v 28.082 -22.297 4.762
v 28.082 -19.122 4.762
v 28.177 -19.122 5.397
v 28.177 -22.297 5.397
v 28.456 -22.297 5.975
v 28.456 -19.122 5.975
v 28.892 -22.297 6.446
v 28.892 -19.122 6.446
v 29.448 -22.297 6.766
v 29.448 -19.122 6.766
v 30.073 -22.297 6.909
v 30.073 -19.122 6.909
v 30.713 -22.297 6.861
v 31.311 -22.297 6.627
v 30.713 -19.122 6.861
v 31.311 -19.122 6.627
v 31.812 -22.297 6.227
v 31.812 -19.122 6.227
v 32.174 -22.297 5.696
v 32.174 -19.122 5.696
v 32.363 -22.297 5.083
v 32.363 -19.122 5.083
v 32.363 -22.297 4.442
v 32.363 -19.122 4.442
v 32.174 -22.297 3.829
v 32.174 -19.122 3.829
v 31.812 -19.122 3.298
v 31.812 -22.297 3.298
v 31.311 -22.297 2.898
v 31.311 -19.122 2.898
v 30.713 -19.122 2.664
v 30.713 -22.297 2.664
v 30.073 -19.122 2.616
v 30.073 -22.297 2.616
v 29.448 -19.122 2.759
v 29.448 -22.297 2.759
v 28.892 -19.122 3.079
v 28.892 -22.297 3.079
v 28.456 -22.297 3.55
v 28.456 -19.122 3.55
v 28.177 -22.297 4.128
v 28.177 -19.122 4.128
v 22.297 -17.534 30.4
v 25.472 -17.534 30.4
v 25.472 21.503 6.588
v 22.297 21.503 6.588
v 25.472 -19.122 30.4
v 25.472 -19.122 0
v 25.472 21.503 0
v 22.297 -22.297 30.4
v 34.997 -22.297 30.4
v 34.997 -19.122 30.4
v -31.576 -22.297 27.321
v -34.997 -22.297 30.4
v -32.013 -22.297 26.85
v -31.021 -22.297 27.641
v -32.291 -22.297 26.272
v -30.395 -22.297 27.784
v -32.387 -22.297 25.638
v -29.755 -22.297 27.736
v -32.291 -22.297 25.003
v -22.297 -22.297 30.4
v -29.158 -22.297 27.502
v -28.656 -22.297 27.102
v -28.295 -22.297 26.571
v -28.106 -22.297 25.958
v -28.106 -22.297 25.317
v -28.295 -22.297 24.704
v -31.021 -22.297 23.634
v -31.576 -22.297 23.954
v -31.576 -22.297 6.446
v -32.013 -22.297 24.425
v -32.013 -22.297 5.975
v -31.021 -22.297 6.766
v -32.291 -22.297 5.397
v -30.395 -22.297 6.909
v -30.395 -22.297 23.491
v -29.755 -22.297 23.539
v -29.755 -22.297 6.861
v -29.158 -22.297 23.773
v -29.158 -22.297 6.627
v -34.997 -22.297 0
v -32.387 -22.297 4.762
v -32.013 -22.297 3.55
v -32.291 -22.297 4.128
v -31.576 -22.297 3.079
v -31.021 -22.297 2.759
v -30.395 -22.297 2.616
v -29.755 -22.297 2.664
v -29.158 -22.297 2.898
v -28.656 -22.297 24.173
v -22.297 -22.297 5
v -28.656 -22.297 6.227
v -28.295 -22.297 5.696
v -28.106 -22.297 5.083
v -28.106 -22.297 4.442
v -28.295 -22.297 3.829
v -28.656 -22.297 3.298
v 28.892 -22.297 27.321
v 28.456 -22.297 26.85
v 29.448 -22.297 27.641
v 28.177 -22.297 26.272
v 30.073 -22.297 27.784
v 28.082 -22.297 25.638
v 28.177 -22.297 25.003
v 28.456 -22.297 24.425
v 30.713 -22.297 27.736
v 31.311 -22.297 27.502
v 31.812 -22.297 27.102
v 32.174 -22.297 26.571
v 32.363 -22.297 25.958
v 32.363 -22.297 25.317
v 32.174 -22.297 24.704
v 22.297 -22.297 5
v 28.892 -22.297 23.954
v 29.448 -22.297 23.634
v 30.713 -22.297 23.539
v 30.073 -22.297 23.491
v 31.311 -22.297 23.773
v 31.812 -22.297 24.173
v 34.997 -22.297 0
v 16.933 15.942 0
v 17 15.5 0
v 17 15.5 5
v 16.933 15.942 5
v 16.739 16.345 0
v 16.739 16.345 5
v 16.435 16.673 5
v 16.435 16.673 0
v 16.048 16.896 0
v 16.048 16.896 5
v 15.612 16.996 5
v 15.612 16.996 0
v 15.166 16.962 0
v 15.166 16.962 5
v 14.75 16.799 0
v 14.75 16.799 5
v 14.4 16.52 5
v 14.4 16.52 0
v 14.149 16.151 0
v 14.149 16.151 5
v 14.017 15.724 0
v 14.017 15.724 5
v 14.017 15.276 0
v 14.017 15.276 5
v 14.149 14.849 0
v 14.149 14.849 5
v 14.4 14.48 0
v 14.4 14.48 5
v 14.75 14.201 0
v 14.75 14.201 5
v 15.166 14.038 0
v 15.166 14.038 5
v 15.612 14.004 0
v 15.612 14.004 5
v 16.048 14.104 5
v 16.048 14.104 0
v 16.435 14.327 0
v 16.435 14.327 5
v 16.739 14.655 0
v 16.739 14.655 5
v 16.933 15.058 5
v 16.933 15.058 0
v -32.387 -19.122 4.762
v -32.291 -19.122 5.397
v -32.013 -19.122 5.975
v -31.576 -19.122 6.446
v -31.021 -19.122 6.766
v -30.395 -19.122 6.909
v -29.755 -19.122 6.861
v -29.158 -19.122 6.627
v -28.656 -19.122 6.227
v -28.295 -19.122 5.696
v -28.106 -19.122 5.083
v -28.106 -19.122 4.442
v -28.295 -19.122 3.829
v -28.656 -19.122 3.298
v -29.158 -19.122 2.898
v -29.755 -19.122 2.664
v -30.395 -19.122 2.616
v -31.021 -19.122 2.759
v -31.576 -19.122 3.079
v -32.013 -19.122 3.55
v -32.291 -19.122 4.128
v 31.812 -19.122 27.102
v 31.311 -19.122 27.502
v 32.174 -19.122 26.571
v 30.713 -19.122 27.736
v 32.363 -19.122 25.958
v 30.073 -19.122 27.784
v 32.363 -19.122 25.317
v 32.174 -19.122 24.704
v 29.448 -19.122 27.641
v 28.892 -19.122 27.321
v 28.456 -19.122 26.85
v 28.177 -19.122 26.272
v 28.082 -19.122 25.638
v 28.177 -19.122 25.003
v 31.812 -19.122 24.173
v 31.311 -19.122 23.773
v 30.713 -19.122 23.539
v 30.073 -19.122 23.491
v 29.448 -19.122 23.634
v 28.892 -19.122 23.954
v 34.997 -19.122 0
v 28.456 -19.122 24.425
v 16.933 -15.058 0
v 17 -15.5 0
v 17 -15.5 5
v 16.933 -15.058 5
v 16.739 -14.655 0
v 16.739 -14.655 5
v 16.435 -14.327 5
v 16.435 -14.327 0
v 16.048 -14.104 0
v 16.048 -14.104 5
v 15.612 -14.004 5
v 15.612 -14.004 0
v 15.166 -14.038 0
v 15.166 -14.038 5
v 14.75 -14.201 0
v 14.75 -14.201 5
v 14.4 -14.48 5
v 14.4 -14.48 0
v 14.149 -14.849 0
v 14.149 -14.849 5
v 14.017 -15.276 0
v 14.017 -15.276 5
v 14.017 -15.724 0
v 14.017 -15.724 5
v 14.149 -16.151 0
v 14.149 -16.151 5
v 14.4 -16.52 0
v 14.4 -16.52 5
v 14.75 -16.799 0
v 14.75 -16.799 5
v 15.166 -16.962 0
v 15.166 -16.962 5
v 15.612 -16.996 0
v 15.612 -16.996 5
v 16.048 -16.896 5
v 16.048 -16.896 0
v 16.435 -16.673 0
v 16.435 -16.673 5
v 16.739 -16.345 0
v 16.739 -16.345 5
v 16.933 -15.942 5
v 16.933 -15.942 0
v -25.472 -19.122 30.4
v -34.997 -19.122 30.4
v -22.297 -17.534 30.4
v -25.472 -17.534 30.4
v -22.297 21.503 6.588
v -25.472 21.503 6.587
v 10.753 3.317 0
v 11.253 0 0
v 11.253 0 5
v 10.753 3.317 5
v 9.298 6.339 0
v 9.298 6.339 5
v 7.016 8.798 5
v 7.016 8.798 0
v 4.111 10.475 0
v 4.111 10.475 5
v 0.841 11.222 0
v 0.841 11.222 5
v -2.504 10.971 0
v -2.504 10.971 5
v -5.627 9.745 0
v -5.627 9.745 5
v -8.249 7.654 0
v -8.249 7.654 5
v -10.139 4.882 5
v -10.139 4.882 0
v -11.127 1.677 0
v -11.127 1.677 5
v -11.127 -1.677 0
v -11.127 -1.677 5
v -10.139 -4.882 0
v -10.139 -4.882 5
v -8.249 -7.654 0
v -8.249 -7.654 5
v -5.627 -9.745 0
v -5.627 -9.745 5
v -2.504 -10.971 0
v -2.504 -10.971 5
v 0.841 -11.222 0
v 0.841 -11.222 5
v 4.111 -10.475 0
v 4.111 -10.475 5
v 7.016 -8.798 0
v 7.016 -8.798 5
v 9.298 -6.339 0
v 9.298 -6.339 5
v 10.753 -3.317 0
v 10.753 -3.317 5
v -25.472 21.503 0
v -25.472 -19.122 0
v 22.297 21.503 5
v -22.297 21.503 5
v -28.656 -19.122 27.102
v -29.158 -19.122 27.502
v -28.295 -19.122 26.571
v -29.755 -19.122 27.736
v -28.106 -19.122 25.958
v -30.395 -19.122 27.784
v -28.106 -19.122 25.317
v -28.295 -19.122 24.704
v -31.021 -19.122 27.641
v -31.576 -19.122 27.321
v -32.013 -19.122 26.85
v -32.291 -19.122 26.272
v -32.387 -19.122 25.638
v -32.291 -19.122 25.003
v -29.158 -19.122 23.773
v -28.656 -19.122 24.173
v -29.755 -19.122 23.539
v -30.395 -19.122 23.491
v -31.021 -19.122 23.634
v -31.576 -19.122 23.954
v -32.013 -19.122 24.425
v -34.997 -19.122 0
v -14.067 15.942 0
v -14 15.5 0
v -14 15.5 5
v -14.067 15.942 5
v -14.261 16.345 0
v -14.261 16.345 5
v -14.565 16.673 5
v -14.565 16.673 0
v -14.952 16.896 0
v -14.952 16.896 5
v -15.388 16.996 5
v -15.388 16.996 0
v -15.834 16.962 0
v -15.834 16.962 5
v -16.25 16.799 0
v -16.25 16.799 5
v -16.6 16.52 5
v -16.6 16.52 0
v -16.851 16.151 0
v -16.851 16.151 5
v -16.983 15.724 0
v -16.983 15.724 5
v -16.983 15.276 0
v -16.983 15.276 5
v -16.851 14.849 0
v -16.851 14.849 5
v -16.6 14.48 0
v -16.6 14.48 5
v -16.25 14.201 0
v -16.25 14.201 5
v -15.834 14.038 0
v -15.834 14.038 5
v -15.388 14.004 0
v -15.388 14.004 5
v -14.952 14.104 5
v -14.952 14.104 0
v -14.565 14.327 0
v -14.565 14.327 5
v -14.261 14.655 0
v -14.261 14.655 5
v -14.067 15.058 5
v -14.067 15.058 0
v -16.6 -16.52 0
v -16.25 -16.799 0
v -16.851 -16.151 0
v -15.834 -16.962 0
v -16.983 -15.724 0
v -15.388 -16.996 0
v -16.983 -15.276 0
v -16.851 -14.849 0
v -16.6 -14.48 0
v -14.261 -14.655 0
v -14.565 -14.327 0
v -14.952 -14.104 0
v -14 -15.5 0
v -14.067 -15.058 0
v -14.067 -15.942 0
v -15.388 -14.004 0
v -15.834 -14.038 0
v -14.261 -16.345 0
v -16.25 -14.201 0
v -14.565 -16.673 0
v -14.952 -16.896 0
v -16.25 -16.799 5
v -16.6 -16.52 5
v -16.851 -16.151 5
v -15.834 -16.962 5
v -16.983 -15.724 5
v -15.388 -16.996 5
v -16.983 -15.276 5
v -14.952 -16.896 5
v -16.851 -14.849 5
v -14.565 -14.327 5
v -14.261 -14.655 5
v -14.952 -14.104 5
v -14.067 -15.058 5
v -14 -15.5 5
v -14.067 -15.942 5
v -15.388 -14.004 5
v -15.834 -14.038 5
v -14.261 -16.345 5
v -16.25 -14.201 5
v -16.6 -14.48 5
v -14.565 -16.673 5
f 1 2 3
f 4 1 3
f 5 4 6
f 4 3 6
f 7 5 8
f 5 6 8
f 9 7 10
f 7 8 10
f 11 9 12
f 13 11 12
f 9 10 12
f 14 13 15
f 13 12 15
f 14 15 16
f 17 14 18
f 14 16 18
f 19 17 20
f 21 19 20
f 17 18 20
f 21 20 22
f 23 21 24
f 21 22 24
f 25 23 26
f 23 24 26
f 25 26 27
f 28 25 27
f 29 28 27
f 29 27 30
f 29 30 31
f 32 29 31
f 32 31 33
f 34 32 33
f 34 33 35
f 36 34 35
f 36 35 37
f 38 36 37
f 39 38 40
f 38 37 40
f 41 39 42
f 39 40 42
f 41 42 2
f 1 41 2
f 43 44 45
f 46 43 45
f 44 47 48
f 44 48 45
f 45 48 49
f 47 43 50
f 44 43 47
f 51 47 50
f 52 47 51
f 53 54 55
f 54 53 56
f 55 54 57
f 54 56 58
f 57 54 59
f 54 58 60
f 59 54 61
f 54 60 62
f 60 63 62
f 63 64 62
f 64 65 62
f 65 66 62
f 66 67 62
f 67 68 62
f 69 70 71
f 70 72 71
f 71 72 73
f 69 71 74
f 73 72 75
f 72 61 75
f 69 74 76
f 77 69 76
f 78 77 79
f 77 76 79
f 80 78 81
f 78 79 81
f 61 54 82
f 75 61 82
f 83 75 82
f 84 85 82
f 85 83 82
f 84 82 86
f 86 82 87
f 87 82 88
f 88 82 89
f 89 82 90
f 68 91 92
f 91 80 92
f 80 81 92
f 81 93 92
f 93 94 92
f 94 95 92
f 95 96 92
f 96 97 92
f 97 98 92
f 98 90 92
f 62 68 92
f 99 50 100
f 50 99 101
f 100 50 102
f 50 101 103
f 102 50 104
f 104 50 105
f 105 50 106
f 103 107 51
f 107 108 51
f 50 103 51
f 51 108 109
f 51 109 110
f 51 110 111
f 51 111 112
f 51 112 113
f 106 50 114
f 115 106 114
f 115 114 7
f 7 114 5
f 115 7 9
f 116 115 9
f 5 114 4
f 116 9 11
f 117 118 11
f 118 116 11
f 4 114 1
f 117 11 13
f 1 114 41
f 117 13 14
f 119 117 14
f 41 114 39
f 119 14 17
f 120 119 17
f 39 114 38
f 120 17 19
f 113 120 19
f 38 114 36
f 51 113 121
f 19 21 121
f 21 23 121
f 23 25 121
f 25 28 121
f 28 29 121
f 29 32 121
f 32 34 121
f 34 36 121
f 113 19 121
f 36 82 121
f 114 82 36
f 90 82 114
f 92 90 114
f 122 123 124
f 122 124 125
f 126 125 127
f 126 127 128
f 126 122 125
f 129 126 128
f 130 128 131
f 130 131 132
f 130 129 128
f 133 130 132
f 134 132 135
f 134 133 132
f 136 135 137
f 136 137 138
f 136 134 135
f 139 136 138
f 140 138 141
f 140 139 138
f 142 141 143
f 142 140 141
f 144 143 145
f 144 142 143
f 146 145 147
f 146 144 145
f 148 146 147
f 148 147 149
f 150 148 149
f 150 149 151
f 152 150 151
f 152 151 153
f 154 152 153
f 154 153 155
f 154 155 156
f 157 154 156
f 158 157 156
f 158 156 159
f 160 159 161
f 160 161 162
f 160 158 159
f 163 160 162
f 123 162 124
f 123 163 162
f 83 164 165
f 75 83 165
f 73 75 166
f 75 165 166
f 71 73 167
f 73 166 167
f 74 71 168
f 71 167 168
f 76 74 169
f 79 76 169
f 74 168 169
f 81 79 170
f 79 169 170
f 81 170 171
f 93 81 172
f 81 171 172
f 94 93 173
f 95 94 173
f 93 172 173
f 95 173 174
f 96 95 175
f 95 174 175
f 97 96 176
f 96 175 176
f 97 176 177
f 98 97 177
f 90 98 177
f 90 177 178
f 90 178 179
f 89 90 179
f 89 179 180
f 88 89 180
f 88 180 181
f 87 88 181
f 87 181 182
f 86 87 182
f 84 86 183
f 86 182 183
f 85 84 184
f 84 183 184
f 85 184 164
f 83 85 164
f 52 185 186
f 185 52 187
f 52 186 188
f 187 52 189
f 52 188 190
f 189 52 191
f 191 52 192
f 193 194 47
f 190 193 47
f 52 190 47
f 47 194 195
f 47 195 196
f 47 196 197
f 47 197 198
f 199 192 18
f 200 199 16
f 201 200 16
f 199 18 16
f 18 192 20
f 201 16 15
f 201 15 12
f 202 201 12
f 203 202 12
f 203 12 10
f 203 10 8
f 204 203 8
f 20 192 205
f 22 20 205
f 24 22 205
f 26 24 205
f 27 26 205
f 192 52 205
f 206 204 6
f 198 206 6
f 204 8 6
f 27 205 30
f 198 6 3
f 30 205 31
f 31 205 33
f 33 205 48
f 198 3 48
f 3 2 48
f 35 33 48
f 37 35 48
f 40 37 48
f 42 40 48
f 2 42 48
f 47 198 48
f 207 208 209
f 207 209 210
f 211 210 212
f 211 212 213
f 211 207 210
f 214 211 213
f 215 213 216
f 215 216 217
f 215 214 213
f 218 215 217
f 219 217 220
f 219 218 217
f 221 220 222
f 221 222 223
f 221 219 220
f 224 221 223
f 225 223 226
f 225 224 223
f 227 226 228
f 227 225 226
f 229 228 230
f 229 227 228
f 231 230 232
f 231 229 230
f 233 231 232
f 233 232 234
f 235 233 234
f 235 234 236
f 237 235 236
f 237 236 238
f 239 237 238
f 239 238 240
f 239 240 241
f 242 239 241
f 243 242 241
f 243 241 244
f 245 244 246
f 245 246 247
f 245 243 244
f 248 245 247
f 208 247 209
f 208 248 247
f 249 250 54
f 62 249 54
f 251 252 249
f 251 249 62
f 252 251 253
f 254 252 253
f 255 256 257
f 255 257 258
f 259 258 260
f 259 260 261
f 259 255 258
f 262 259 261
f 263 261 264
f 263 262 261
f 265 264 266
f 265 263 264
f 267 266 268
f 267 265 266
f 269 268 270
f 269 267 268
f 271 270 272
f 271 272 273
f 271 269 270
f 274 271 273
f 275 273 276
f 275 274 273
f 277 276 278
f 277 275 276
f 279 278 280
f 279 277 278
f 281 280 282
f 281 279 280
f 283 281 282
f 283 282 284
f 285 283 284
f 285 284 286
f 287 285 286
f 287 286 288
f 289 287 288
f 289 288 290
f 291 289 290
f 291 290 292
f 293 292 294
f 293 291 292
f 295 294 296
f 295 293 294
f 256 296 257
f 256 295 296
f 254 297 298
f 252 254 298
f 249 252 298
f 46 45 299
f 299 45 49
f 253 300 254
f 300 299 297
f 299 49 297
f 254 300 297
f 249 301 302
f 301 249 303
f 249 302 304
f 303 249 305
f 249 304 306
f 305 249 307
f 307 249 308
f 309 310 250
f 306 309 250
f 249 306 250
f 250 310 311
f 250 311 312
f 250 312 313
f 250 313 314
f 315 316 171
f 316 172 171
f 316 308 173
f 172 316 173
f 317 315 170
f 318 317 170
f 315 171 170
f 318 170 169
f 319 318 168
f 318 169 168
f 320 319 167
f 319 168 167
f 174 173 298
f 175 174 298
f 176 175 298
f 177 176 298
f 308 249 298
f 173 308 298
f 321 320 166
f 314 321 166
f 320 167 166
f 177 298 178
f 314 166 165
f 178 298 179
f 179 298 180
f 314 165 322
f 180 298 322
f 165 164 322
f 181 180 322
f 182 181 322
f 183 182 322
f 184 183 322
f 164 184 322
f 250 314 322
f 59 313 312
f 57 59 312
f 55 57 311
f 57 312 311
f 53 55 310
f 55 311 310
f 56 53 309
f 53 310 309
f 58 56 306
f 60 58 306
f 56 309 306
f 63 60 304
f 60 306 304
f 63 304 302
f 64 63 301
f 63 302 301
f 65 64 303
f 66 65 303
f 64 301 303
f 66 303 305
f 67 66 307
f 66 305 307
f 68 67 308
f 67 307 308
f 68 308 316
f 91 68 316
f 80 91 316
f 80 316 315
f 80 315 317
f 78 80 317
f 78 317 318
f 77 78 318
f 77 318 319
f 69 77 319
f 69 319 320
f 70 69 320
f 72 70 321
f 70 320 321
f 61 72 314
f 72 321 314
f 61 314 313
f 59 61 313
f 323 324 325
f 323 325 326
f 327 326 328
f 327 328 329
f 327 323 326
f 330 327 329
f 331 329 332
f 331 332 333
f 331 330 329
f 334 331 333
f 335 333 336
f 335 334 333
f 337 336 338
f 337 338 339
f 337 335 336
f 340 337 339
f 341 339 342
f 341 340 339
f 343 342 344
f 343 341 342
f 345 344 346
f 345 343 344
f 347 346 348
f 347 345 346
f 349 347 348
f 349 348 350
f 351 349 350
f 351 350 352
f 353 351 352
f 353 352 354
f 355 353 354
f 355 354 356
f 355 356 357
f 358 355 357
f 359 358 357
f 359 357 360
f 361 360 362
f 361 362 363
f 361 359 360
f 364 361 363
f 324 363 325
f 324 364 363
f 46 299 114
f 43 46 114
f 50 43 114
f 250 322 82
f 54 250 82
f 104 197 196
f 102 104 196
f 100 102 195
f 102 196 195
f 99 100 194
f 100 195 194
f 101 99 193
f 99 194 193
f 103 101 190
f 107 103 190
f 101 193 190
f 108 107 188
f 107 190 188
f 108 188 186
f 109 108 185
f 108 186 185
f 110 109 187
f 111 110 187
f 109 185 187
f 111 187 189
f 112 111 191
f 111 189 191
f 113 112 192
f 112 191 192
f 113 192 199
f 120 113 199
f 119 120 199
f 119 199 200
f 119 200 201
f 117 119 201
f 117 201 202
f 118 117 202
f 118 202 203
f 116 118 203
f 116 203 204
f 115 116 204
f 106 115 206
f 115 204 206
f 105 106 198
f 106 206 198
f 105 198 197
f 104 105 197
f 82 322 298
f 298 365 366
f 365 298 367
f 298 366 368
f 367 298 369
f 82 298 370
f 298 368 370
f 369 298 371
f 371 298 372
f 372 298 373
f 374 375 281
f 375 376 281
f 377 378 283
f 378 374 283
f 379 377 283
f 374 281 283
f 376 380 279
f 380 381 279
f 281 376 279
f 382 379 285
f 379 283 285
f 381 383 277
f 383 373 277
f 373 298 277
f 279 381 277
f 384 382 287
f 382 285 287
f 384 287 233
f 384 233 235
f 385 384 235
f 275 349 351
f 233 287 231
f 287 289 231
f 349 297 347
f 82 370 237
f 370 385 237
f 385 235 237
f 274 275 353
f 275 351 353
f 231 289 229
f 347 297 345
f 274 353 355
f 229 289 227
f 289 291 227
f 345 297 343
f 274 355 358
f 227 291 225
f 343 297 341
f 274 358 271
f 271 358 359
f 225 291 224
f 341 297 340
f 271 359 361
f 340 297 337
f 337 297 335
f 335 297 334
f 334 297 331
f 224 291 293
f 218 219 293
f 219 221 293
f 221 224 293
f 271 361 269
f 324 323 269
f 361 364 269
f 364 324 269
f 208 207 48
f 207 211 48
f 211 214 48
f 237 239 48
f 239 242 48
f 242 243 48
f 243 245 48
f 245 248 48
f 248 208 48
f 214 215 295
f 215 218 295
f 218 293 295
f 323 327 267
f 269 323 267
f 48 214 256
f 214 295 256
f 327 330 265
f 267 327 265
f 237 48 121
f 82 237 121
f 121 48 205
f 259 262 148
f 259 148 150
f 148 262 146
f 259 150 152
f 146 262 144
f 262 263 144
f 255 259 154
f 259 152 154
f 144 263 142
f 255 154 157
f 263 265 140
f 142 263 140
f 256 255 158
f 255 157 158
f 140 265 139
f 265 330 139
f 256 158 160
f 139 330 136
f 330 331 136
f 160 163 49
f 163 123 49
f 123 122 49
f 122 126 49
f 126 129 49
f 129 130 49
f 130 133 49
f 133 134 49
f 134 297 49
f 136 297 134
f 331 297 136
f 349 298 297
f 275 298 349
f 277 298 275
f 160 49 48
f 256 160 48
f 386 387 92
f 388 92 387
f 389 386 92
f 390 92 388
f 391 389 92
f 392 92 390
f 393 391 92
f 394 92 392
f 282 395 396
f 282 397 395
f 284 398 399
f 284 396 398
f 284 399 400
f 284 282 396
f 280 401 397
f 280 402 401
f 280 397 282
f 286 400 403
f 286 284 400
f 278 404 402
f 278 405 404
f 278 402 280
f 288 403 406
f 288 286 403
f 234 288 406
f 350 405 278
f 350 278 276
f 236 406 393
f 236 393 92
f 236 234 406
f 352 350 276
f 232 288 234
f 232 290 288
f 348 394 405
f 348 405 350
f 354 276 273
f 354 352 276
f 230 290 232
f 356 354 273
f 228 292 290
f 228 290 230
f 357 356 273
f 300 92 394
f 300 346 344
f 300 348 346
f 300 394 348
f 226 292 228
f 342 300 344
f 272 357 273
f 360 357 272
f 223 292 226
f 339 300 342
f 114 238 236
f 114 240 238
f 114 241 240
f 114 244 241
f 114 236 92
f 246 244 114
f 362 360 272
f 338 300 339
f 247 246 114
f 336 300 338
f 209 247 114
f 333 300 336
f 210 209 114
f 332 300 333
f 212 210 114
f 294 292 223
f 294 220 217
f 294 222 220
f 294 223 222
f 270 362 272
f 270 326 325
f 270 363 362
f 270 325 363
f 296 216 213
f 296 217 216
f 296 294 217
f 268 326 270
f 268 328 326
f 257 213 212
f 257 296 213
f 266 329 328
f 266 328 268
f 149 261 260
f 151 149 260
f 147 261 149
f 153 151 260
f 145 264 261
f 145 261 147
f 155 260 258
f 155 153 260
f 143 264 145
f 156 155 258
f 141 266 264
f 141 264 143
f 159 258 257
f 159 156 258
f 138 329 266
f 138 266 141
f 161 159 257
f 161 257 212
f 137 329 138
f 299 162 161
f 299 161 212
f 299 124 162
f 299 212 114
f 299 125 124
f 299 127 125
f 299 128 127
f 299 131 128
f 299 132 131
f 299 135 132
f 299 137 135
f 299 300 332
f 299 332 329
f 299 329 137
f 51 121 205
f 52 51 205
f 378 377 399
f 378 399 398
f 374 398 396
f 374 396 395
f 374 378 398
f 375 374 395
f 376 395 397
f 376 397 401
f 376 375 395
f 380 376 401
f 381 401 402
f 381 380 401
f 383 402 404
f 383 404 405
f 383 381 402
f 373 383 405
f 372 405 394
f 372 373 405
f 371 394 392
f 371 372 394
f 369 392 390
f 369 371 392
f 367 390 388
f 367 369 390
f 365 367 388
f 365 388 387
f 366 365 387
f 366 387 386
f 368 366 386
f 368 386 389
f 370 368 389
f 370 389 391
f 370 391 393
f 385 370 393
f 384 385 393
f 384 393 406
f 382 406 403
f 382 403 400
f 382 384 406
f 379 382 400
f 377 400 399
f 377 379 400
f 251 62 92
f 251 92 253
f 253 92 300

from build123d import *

# Parameters (mm, degrees)
F0_R     = 1.5
F0_R_2   = 11.253
F1_DEPTH = 5
F3_DEPTH = 25.4
F4_R     = 2.15265
F5_DEPTH = 3.175
F7_DEPTH = 50.943485


with BuildPart() as f1:
    # F0 (on Top) → F1 (new body)
    with BuildSketch(Plane.XY):
        Polygon((25.471742, 21.502992), (-25.471742, 21.502992), (-25.471742, -19.121742), (-34.996742, -19.121742), (-34.996742, -22.296742), (34.996742, -22.296742), (34.996742, -19.121742), (25.471742, -19.121742), align=None)
        with Locations((-15.499994, -15.499994)):
            Circle(F0_R, mode=Mode.SUBTRACT)
        with Locations((15.499994, -15.499994)):
            Circle(F0_R, mode=Mode.SUBTRACT)
        Circle(F0_R_2, mode=Mode.SUBTRACT)
        with Locations((-15.499994, 15.499994)):
            Circle(F0_R, mode=Mode.SUBTRACT)
        with Locations((15.499994, 15.499994)):
            Circle(F0_R, mode=Mode.SUBTRACT)
    extrude(amount=F1_DEPTH)

    # F2 (on face) → F3 (join)
    with BuildSketch(Plane.XY.offset(5)):
        Polygon((-34.996742, -19.121742), (-34.996742, -22.296742), (-22.296742, -22.296742), (-22.296742, 21.502992), (-25.471742, 21.502992), (-25.471742, -19.121742), align=None)
        Polygon((25.471742, -19.121742), (25.471742, 21.502992), (22.296742, 21.502992), (22.296742, -22.296742), (34.996742, -22.296742), (34.996742, -19.121742), align=None)
    extrude(amount=F3_DEPTH)

    # F4 (on face) → F5 (cut, through all)
    with BuildSketch(Plane(origin=(0, -19.121742, 0), x_dir=(-1, 0, 0), z_dir=(0, 1, 0))):
        with Locations((30.234242, 4.7625)):
            Circle(F4_R)
        with Locations((30.234242, 25.6375)):
            Circle(F4_R)
        with Locations((-30.234242, 25.6375)):
            Circle(F4_R)
        with Locations((-30.234242, 4.7625)):
            Circle(F4_R)
    extrude(amount=-F5_DEPTH, mode=Mode.SUBTRACT)

    # F6 (on face) → F7 (cut, through all)
    with BuildSketch(Plane.YZ.offset(25.471742)):
        Polygon((21.502992, 6.5875), (21.502992, 30.4), (-17.534242, 30.4), align=None)
    extrude(amount=-F7_DEPTH, mode=Mode.SUBTRACT)


solid = f1.part
